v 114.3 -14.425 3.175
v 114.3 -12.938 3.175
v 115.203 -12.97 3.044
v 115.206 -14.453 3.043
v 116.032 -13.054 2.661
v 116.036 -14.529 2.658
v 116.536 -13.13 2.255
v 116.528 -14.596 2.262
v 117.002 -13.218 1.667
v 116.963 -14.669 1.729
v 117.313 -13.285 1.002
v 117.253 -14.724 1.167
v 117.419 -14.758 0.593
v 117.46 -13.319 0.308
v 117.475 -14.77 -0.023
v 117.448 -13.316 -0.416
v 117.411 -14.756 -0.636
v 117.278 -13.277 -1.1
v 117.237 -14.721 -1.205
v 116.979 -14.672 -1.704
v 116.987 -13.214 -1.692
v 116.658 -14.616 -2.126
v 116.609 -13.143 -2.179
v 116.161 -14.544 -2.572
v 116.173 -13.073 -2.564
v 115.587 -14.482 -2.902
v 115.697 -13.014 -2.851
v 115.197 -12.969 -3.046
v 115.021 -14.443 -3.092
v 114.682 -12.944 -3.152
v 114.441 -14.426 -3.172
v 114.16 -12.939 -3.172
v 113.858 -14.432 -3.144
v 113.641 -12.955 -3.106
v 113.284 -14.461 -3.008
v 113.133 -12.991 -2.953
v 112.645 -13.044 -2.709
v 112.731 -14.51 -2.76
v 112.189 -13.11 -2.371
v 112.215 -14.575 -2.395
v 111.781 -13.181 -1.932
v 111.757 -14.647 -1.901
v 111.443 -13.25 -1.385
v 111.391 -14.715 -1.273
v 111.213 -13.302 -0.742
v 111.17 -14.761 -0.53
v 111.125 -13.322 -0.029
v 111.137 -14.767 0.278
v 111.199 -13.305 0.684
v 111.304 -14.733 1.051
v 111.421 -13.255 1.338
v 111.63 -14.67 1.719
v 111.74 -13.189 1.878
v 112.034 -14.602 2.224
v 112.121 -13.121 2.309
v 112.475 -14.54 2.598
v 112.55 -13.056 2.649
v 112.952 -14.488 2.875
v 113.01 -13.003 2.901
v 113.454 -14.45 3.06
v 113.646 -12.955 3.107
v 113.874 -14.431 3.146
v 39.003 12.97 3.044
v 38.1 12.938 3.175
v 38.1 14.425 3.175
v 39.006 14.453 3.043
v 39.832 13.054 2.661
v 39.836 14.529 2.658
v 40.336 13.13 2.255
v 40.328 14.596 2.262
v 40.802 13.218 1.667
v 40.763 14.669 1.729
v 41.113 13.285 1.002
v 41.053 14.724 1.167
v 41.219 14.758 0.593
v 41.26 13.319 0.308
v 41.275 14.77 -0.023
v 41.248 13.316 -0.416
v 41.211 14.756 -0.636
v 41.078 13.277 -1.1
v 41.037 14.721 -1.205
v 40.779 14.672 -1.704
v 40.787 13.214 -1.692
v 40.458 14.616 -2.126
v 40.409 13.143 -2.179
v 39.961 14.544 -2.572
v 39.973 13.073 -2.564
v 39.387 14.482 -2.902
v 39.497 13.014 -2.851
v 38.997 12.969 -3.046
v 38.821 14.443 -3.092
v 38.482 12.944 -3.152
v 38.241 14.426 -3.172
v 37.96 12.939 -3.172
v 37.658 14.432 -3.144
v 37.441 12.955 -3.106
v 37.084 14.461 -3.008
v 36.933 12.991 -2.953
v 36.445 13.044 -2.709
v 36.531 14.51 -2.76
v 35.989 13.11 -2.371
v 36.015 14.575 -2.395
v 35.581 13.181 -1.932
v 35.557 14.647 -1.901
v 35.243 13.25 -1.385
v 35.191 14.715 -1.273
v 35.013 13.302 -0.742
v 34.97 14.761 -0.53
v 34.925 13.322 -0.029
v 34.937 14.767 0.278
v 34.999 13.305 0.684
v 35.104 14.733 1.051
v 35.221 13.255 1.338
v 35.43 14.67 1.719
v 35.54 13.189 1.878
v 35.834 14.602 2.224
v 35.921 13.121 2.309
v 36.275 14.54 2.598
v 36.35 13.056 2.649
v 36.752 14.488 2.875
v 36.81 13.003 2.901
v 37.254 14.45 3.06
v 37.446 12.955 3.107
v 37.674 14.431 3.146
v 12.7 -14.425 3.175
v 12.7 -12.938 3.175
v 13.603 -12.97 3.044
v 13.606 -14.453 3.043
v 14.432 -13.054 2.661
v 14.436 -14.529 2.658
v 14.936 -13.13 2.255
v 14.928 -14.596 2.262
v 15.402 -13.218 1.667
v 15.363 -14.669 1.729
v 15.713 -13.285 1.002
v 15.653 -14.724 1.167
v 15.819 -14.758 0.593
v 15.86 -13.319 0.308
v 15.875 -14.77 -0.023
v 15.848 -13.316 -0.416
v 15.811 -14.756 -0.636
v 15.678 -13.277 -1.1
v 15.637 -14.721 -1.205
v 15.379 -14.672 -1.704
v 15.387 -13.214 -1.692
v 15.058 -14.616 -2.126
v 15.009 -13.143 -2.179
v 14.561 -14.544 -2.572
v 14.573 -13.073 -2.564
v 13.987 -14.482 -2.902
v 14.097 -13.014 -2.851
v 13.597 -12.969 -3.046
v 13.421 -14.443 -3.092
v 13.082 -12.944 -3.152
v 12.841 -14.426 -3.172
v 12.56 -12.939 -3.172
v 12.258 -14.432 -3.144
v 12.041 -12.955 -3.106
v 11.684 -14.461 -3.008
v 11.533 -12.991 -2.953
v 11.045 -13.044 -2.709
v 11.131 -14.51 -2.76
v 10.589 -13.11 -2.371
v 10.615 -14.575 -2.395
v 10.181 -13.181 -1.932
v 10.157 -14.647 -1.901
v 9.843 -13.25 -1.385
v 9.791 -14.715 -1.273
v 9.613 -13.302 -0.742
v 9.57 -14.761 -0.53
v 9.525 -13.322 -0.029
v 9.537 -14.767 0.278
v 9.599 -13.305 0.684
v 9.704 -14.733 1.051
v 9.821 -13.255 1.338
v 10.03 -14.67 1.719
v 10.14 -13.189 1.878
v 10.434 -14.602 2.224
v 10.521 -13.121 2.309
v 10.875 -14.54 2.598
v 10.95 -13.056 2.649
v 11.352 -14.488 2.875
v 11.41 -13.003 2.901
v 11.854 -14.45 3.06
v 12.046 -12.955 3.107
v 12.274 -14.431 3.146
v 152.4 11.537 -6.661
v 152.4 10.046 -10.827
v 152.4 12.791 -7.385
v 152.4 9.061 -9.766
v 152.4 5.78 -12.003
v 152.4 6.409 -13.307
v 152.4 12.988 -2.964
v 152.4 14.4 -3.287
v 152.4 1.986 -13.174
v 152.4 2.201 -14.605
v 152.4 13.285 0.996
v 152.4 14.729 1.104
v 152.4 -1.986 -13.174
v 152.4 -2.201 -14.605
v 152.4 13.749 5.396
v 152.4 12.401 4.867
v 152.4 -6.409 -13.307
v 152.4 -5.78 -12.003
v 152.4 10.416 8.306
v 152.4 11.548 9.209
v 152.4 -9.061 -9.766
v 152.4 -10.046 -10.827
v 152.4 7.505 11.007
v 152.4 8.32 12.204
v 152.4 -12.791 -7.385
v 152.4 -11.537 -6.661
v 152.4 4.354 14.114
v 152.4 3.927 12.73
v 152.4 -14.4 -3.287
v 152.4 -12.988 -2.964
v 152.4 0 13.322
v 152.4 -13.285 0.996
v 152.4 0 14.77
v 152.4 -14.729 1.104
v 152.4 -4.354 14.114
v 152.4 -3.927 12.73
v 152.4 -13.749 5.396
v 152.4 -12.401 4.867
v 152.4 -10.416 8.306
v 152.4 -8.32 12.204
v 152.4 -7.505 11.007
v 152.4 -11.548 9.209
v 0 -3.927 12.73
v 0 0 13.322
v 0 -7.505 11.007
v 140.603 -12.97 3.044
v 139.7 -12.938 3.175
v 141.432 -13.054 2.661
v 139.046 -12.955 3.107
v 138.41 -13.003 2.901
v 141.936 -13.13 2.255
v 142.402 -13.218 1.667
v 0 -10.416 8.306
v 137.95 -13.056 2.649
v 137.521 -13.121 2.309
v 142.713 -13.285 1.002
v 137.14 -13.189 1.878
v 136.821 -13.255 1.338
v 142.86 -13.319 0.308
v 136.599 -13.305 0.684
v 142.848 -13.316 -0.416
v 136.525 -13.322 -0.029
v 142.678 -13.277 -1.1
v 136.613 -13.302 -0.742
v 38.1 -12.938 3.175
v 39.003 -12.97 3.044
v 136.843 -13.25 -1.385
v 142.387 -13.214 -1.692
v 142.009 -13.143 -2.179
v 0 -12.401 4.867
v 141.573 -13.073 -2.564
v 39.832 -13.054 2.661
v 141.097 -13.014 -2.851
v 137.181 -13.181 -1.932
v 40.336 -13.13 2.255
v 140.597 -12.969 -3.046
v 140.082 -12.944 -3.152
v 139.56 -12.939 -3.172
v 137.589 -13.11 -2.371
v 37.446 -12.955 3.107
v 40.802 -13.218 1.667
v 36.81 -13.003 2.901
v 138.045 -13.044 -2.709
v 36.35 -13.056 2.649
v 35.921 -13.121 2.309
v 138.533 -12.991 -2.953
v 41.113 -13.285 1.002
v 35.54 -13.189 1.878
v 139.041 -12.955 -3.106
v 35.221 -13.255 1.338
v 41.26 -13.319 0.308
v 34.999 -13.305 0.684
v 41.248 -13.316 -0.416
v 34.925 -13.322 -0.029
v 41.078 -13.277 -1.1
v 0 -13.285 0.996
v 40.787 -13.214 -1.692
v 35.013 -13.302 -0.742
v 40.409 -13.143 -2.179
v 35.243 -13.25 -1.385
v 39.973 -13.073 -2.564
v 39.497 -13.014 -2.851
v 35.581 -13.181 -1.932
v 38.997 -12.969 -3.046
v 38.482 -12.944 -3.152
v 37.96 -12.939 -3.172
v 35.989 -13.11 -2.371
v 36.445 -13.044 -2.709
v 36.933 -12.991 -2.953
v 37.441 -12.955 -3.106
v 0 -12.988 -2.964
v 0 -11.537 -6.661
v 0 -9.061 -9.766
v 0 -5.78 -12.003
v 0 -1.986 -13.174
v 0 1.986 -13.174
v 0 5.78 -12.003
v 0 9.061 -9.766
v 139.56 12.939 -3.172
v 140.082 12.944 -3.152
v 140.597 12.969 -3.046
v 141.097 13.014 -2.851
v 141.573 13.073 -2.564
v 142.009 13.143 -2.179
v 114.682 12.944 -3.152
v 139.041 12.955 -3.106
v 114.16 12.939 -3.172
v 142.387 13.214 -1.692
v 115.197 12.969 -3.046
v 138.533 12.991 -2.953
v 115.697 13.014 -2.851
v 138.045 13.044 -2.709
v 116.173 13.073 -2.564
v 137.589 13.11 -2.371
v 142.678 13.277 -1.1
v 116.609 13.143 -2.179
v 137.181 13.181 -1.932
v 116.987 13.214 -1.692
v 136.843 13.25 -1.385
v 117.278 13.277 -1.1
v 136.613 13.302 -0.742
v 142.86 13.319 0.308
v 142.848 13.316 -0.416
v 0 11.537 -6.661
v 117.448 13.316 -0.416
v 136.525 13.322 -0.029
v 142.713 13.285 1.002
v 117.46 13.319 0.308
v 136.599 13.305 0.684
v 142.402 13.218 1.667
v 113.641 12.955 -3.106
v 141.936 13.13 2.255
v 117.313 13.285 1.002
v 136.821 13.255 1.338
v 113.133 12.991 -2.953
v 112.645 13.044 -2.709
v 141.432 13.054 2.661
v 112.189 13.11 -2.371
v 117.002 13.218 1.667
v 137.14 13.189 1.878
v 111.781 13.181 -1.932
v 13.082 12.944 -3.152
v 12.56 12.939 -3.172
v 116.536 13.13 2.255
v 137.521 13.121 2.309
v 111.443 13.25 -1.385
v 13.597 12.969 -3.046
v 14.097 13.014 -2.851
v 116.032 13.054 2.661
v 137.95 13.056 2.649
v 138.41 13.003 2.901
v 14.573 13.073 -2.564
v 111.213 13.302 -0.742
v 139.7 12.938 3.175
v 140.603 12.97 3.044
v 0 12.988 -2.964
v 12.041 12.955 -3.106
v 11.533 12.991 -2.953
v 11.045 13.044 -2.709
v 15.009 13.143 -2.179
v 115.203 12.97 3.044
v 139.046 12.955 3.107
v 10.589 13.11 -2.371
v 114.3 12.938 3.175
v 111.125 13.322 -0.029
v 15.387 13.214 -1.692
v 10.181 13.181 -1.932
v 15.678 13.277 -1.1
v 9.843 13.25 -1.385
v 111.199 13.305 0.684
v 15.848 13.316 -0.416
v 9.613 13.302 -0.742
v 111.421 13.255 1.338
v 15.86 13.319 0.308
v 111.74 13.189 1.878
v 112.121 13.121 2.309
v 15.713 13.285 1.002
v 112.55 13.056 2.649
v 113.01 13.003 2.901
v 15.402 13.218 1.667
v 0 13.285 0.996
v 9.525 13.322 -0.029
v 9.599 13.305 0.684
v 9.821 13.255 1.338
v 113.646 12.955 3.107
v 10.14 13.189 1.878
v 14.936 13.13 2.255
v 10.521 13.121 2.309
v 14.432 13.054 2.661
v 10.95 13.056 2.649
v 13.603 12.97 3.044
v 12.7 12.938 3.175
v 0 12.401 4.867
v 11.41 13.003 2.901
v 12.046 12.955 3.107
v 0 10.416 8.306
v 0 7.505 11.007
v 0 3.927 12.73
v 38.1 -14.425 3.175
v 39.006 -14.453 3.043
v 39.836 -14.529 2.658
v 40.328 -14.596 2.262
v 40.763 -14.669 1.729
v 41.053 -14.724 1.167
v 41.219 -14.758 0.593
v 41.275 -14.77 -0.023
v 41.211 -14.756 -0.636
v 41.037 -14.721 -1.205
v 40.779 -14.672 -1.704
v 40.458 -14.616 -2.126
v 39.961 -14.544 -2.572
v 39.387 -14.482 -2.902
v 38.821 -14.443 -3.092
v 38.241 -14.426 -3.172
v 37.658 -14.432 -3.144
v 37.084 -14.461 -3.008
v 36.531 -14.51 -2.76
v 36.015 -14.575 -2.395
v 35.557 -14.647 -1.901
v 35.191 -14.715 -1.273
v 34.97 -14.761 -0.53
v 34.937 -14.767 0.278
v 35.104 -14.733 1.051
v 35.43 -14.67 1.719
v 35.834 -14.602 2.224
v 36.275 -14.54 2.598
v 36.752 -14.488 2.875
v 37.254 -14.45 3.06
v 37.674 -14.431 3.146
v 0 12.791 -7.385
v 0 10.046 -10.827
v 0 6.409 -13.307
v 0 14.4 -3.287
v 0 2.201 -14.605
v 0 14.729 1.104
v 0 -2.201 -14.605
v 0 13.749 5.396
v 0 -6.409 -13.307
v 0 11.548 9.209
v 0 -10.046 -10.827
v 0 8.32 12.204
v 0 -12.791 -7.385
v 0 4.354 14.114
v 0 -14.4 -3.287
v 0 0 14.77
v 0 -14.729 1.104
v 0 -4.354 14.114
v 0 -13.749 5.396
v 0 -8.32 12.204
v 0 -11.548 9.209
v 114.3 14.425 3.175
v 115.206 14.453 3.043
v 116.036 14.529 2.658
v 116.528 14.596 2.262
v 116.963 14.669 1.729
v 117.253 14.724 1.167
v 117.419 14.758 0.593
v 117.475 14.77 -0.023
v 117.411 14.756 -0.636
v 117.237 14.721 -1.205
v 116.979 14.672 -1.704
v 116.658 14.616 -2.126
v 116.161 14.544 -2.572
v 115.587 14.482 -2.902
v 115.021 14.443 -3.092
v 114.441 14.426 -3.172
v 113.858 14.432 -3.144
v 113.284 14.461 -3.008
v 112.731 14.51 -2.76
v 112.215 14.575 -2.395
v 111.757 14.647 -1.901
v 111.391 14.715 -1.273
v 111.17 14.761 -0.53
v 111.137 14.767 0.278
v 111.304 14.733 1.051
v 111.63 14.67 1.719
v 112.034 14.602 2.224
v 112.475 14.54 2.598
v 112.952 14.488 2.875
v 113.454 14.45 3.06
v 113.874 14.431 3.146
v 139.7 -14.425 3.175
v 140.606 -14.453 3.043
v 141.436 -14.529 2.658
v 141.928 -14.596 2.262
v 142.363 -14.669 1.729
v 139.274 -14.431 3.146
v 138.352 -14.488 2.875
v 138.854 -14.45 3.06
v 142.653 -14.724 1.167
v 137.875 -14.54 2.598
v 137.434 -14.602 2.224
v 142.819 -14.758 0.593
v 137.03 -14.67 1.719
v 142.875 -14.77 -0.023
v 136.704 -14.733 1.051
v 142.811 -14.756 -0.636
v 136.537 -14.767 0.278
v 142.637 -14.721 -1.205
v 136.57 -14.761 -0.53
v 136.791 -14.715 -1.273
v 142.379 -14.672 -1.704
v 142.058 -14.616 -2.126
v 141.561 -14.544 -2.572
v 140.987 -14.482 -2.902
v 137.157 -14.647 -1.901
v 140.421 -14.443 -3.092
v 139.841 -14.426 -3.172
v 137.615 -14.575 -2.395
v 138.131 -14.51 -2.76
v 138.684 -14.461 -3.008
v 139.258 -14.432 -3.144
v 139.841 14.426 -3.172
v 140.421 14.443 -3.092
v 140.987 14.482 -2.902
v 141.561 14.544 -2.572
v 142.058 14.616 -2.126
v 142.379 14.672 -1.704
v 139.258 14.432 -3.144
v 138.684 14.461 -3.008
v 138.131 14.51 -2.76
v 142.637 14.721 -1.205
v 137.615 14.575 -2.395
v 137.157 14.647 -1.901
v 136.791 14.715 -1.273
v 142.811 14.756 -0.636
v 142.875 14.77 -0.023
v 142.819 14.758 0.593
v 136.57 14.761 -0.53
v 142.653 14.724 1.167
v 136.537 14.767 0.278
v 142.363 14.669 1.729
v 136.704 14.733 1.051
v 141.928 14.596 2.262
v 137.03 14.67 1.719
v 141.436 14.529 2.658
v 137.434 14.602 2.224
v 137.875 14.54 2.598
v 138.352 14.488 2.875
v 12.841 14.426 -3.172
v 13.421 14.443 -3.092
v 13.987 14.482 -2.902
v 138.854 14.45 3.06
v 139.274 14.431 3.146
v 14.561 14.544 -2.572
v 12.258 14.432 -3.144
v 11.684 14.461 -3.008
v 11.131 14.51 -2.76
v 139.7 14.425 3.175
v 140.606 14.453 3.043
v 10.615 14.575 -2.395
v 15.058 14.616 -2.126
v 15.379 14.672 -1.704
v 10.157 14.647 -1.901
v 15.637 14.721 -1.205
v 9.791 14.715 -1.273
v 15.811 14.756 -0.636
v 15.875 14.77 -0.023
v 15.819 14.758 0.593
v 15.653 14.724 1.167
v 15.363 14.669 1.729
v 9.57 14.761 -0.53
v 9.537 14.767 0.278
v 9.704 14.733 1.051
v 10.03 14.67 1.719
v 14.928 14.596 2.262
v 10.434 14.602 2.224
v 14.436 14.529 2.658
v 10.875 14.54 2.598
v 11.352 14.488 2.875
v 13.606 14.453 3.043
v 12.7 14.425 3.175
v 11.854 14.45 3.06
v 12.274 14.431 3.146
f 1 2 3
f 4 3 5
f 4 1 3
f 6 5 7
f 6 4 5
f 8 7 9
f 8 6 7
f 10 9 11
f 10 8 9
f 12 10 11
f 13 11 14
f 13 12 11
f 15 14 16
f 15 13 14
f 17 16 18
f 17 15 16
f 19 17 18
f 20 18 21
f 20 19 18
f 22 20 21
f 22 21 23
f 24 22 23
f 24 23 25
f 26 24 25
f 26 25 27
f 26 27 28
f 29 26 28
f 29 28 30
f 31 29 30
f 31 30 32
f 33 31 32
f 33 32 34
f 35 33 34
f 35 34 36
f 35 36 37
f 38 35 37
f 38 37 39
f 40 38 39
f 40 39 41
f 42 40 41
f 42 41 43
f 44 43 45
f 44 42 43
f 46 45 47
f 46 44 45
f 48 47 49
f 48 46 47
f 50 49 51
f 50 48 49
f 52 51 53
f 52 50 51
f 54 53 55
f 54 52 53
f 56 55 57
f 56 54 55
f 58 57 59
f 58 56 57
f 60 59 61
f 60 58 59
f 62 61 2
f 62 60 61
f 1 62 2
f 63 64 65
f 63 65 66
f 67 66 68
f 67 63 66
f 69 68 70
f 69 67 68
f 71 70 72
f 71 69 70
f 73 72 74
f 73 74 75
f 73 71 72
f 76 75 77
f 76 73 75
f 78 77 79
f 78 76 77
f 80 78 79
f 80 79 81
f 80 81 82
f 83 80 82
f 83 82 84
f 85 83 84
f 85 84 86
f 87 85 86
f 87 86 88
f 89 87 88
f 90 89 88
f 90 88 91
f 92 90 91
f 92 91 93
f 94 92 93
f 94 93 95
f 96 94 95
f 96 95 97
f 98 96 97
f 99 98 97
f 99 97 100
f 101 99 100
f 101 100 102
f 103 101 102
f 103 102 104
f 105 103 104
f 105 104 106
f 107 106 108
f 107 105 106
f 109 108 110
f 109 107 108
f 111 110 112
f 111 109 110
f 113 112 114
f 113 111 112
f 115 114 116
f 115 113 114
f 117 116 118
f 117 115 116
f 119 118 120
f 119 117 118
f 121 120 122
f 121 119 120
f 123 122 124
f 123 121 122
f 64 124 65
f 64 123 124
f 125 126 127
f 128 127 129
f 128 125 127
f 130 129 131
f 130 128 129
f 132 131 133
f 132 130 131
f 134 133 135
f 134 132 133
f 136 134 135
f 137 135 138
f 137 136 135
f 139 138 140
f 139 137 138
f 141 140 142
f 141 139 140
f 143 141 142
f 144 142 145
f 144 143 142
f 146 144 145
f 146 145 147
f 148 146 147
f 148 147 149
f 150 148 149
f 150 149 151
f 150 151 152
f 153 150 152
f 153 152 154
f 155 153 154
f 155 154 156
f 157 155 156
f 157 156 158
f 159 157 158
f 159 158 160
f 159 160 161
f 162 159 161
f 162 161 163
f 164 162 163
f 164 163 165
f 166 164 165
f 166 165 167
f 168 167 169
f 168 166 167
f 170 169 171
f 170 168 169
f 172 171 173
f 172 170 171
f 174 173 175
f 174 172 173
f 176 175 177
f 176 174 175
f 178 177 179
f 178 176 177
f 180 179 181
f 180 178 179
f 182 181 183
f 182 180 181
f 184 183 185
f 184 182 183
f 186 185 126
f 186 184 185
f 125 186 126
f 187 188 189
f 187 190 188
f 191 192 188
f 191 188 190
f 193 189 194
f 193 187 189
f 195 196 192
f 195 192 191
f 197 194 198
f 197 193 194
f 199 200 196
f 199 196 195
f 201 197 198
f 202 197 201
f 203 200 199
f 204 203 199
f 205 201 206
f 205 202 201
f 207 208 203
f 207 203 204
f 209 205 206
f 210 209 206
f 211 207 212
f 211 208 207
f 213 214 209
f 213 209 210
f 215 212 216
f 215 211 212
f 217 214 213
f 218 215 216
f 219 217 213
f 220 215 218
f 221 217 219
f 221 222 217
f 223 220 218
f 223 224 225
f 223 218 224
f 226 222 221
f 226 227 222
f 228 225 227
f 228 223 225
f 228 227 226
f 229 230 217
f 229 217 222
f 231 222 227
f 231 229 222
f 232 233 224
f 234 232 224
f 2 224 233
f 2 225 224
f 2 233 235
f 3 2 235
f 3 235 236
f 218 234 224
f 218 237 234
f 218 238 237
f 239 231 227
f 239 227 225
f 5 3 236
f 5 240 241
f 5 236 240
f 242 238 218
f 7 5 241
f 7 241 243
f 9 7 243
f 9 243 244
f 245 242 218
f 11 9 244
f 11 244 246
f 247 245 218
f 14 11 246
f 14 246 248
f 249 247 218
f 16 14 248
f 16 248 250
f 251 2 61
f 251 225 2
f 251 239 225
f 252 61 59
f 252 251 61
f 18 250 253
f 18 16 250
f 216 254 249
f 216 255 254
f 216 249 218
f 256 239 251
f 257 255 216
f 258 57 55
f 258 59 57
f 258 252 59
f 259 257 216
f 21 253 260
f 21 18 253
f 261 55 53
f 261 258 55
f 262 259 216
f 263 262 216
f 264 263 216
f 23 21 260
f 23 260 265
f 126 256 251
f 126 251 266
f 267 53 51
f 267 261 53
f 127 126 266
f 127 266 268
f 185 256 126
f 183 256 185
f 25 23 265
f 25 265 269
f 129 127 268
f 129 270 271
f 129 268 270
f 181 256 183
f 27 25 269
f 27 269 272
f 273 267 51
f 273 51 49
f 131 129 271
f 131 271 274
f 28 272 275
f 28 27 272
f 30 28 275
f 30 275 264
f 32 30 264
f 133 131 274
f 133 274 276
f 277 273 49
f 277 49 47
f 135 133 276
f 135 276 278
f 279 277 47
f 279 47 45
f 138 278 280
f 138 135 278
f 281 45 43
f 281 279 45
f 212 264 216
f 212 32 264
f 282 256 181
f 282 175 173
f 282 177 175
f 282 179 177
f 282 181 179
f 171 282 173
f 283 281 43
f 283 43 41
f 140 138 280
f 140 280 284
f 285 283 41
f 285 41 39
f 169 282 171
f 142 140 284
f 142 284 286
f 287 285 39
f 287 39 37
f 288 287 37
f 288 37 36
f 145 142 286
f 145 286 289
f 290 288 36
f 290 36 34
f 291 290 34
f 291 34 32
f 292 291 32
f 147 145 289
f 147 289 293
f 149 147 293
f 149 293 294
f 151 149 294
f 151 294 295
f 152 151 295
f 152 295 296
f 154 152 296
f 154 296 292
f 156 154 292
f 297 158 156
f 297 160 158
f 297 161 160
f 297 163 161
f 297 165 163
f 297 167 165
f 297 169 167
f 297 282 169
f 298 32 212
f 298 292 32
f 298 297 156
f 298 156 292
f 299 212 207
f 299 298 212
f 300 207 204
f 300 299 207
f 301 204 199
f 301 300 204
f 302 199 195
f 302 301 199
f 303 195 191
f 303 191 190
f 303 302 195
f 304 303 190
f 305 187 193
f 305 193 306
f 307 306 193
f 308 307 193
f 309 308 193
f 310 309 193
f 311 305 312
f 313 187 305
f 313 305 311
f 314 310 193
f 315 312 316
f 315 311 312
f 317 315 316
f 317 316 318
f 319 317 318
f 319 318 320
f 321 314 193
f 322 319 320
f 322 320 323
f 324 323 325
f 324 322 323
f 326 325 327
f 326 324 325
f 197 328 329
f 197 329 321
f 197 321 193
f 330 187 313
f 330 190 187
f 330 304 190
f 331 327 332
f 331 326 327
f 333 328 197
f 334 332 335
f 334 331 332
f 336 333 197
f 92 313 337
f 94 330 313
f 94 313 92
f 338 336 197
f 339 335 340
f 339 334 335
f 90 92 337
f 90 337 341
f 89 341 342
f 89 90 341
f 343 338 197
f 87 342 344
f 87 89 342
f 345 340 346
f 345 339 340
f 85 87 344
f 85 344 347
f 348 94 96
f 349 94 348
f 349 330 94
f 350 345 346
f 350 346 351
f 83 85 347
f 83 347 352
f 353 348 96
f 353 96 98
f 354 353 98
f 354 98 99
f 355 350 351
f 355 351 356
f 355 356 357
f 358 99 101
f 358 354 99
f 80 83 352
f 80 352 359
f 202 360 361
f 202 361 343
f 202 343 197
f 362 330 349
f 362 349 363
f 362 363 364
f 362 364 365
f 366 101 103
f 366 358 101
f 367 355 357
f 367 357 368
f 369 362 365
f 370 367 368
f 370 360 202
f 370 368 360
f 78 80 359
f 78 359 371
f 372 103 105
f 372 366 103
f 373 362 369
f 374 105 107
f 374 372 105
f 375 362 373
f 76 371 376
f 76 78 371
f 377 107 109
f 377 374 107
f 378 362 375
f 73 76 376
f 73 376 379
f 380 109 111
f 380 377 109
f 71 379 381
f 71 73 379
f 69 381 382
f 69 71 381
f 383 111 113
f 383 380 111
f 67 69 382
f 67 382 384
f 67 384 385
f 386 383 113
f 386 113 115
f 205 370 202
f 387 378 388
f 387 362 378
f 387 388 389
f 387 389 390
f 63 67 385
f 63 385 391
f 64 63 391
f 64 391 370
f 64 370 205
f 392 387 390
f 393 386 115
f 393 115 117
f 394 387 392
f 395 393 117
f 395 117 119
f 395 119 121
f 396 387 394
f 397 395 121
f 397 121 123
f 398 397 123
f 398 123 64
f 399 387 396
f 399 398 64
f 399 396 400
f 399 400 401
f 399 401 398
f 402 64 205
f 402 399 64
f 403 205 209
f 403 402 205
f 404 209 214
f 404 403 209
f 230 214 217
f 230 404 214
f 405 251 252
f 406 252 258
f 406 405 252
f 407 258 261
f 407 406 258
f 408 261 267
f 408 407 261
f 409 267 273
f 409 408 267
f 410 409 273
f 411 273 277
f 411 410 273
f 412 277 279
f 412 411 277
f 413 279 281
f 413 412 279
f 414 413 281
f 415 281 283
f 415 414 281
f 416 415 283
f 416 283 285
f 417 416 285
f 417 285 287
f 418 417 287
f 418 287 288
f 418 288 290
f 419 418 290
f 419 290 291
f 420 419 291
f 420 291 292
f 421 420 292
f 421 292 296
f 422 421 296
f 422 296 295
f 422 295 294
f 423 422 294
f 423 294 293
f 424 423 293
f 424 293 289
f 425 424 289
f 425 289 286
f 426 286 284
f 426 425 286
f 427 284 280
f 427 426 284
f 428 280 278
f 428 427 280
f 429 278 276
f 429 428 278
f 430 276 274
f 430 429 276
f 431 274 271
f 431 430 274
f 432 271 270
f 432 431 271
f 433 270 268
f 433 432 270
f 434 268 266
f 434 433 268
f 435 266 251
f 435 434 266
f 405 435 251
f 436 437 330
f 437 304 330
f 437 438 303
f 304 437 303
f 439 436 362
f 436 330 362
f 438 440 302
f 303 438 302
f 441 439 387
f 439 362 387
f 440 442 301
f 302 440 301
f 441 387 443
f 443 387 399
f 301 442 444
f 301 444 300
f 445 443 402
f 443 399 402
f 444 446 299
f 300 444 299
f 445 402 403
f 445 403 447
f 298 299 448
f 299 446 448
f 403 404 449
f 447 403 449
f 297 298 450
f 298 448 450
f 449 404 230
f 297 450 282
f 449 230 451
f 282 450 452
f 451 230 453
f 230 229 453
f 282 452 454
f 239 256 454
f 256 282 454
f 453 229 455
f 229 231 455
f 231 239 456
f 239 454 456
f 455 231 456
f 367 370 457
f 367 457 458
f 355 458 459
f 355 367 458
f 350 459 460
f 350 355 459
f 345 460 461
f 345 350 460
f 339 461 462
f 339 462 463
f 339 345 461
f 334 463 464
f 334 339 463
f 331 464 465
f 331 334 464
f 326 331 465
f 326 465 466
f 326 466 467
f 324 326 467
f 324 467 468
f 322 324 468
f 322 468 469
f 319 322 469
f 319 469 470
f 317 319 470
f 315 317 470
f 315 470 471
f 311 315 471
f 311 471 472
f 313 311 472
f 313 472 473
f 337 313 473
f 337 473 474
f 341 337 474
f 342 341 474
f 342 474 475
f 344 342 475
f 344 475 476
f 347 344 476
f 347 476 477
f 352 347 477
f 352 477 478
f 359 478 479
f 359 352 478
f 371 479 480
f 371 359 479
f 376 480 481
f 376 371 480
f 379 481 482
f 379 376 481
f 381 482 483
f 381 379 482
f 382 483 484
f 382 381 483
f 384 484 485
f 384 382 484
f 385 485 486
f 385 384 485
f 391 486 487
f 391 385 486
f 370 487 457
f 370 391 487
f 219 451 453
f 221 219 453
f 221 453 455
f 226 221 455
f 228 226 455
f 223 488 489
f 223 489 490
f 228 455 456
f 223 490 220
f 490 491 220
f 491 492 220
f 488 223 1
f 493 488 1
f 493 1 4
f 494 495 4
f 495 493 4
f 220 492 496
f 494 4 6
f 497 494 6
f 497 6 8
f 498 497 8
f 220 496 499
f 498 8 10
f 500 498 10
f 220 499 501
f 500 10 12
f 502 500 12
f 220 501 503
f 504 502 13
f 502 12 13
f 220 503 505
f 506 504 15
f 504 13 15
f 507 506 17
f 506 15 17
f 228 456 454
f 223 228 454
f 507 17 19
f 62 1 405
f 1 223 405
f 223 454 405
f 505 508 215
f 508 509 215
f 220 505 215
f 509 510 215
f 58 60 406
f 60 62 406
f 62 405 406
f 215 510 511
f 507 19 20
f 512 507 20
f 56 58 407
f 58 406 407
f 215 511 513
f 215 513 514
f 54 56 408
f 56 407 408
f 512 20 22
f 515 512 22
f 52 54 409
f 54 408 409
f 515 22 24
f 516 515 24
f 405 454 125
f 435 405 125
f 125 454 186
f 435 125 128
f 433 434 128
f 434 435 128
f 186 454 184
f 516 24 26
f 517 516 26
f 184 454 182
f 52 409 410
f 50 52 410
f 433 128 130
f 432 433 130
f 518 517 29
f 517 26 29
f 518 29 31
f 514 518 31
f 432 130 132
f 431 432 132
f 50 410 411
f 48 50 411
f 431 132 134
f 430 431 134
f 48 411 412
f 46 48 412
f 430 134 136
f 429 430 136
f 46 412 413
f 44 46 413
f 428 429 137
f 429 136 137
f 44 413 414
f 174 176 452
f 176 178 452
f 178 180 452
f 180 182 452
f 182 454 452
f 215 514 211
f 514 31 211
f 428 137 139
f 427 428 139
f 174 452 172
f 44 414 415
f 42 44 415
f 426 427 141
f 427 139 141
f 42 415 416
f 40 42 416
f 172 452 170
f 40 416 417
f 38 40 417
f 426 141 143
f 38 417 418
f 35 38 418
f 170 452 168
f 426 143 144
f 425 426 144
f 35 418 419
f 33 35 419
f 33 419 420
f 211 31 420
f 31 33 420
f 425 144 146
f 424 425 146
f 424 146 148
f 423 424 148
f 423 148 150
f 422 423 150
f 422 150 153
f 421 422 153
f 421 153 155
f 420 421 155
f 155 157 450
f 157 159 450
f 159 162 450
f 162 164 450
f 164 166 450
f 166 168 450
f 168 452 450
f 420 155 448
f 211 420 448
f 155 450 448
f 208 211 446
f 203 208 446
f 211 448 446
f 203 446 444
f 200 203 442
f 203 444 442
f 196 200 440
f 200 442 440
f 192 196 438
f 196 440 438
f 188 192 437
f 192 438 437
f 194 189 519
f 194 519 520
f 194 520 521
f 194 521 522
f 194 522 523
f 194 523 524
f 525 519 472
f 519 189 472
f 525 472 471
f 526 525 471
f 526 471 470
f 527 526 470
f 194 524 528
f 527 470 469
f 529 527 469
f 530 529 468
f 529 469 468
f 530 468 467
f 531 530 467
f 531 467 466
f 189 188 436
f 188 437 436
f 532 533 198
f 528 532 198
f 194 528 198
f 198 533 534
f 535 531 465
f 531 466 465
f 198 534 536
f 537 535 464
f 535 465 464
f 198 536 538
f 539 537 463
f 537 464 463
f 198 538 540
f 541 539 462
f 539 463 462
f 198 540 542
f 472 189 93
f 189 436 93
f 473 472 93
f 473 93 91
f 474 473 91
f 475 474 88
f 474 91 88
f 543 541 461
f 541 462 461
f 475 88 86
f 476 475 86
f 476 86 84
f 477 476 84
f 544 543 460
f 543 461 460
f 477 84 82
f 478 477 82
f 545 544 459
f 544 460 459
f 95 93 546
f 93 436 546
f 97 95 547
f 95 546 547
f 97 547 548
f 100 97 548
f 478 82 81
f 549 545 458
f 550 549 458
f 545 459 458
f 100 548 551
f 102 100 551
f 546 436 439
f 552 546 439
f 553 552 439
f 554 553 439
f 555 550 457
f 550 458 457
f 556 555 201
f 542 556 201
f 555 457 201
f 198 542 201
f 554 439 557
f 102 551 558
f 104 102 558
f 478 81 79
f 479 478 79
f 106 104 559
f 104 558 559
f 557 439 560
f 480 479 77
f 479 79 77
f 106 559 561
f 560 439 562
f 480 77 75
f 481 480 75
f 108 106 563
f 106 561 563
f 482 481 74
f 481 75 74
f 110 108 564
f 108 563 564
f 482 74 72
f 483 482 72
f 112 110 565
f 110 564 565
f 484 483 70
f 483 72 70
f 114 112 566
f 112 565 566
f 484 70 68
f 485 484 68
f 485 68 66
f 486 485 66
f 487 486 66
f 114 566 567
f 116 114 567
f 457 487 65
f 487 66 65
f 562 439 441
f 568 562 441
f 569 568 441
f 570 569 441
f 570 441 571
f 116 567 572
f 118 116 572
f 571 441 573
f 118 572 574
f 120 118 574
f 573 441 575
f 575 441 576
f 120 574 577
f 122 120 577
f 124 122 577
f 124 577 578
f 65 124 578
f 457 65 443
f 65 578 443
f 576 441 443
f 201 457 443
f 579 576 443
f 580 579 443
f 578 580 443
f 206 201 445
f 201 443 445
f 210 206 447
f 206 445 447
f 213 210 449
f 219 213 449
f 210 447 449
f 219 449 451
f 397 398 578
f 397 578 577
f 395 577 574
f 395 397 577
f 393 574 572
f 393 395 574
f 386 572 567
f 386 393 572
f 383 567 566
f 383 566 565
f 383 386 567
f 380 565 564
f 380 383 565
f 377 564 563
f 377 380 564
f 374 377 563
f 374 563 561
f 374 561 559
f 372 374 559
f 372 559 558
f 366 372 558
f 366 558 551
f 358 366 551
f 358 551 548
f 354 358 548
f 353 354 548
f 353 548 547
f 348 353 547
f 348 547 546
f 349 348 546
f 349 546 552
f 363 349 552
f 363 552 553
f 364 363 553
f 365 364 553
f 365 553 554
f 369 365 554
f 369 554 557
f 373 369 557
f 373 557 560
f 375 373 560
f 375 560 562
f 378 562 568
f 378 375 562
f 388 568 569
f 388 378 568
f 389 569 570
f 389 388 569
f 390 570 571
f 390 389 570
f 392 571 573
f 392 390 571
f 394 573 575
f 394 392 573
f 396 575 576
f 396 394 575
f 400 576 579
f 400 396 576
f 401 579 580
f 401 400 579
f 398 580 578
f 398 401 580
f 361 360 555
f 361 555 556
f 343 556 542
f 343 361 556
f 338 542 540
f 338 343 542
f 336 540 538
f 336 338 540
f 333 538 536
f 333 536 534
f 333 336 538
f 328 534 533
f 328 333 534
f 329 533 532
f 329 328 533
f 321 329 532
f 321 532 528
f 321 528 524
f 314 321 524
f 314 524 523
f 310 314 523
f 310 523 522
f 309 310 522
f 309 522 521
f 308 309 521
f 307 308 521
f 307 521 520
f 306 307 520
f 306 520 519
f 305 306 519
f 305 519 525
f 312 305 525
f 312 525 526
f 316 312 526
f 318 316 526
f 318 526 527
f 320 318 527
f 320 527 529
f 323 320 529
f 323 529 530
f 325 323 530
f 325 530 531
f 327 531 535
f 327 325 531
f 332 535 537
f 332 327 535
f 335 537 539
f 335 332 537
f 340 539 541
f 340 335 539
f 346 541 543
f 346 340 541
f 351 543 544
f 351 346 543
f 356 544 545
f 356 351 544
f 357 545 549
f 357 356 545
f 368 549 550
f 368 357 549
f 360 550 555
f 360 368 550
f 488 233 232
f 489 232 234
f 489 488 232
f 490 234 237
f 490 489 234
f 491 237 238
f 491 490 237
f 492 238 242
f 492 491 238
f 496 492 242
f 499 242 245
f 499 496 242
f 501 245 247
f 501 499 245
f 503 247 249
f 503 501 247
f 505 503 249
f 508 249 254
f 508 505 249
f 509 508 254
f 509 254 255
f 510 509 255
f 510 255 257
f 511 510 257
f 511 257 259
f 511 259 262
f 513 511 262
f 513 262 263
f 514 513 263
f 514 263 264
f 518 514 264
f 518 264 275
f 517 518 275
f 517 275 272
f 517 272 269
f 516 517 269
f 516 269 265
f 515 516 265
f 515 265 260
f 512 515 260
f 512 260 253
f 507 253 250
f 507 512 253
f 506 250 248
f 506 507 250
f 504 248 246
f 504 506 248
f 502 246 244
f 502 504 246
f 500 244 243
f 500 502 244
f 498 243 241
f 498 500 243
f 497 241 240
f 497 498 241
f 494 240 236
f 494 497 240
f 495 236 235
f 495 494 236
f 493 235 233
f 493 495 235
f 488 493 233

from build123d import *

# Parameters (mm, degrees)
SKETCH3_R               = 14.7701
SKETCH3_R_2             = 13.3223
BOSS_EXTRUDE1_DEPTH     = 152.4
CUT_EXTRUDE1_DEPTH      = 154.824808493
CUT_EXTRUDE1_DEPTH_BACK = 154.824808493
SKETCH4_R               = 3.175


with BuildPart() as part:
    # Sketch3 → Boss-Extrude1 (new body)
    with BuildSketch(Plane(origin=(0, 0, 0), x_dir=(0, 0, -1), z_dir=(1, 0, 0))):
        with Locations(Location((0, 0, 0), (0, 0, 180))):
            Circle(SKETCH3_R)
        with Locations(Location((0, 0, 0), (0, 0, 180))):
            Circle(SKETCH3_R_2, mode=Mode.SUBTRACT)
    extrude(amount=BOSS_EXTRUDE1_DEPTH)

    # Sketch4 → Cut-Extrude1 (cut, two sides: drawn at the far end of the back side and taken through both)
    with BuildSketch(Plane(origin=(0, 0, 0), x_dir=(1, 0, 0), z_dir=(0, 1, 0)).offset(-CUT_EXTRUDE1_DEPTH_BACK)):
        with Locations(Location((12.7, 0, 0), (0, 0, 270))):
            Circle(SKETCH4_R)
        with Locations(Location((38.1, 0, 0), (0, 0, 270))):
            Circle(SKETCH4_R)
        with Locations(Location((139.7, 0, 0), (0, 0, 270))):
            Circle(SKETCH4_R)
        with Locations(Location((114.3, 0, 0), (0, 0, 270))):
            Circle(SKETCH4_R)
    extrude(amount=CUT_EXTRUDE1_DEPTH + CUT_EXTRUDE1_DEPTH_BACK, mode=Mode.SUBTRACT)


solid = part.part
